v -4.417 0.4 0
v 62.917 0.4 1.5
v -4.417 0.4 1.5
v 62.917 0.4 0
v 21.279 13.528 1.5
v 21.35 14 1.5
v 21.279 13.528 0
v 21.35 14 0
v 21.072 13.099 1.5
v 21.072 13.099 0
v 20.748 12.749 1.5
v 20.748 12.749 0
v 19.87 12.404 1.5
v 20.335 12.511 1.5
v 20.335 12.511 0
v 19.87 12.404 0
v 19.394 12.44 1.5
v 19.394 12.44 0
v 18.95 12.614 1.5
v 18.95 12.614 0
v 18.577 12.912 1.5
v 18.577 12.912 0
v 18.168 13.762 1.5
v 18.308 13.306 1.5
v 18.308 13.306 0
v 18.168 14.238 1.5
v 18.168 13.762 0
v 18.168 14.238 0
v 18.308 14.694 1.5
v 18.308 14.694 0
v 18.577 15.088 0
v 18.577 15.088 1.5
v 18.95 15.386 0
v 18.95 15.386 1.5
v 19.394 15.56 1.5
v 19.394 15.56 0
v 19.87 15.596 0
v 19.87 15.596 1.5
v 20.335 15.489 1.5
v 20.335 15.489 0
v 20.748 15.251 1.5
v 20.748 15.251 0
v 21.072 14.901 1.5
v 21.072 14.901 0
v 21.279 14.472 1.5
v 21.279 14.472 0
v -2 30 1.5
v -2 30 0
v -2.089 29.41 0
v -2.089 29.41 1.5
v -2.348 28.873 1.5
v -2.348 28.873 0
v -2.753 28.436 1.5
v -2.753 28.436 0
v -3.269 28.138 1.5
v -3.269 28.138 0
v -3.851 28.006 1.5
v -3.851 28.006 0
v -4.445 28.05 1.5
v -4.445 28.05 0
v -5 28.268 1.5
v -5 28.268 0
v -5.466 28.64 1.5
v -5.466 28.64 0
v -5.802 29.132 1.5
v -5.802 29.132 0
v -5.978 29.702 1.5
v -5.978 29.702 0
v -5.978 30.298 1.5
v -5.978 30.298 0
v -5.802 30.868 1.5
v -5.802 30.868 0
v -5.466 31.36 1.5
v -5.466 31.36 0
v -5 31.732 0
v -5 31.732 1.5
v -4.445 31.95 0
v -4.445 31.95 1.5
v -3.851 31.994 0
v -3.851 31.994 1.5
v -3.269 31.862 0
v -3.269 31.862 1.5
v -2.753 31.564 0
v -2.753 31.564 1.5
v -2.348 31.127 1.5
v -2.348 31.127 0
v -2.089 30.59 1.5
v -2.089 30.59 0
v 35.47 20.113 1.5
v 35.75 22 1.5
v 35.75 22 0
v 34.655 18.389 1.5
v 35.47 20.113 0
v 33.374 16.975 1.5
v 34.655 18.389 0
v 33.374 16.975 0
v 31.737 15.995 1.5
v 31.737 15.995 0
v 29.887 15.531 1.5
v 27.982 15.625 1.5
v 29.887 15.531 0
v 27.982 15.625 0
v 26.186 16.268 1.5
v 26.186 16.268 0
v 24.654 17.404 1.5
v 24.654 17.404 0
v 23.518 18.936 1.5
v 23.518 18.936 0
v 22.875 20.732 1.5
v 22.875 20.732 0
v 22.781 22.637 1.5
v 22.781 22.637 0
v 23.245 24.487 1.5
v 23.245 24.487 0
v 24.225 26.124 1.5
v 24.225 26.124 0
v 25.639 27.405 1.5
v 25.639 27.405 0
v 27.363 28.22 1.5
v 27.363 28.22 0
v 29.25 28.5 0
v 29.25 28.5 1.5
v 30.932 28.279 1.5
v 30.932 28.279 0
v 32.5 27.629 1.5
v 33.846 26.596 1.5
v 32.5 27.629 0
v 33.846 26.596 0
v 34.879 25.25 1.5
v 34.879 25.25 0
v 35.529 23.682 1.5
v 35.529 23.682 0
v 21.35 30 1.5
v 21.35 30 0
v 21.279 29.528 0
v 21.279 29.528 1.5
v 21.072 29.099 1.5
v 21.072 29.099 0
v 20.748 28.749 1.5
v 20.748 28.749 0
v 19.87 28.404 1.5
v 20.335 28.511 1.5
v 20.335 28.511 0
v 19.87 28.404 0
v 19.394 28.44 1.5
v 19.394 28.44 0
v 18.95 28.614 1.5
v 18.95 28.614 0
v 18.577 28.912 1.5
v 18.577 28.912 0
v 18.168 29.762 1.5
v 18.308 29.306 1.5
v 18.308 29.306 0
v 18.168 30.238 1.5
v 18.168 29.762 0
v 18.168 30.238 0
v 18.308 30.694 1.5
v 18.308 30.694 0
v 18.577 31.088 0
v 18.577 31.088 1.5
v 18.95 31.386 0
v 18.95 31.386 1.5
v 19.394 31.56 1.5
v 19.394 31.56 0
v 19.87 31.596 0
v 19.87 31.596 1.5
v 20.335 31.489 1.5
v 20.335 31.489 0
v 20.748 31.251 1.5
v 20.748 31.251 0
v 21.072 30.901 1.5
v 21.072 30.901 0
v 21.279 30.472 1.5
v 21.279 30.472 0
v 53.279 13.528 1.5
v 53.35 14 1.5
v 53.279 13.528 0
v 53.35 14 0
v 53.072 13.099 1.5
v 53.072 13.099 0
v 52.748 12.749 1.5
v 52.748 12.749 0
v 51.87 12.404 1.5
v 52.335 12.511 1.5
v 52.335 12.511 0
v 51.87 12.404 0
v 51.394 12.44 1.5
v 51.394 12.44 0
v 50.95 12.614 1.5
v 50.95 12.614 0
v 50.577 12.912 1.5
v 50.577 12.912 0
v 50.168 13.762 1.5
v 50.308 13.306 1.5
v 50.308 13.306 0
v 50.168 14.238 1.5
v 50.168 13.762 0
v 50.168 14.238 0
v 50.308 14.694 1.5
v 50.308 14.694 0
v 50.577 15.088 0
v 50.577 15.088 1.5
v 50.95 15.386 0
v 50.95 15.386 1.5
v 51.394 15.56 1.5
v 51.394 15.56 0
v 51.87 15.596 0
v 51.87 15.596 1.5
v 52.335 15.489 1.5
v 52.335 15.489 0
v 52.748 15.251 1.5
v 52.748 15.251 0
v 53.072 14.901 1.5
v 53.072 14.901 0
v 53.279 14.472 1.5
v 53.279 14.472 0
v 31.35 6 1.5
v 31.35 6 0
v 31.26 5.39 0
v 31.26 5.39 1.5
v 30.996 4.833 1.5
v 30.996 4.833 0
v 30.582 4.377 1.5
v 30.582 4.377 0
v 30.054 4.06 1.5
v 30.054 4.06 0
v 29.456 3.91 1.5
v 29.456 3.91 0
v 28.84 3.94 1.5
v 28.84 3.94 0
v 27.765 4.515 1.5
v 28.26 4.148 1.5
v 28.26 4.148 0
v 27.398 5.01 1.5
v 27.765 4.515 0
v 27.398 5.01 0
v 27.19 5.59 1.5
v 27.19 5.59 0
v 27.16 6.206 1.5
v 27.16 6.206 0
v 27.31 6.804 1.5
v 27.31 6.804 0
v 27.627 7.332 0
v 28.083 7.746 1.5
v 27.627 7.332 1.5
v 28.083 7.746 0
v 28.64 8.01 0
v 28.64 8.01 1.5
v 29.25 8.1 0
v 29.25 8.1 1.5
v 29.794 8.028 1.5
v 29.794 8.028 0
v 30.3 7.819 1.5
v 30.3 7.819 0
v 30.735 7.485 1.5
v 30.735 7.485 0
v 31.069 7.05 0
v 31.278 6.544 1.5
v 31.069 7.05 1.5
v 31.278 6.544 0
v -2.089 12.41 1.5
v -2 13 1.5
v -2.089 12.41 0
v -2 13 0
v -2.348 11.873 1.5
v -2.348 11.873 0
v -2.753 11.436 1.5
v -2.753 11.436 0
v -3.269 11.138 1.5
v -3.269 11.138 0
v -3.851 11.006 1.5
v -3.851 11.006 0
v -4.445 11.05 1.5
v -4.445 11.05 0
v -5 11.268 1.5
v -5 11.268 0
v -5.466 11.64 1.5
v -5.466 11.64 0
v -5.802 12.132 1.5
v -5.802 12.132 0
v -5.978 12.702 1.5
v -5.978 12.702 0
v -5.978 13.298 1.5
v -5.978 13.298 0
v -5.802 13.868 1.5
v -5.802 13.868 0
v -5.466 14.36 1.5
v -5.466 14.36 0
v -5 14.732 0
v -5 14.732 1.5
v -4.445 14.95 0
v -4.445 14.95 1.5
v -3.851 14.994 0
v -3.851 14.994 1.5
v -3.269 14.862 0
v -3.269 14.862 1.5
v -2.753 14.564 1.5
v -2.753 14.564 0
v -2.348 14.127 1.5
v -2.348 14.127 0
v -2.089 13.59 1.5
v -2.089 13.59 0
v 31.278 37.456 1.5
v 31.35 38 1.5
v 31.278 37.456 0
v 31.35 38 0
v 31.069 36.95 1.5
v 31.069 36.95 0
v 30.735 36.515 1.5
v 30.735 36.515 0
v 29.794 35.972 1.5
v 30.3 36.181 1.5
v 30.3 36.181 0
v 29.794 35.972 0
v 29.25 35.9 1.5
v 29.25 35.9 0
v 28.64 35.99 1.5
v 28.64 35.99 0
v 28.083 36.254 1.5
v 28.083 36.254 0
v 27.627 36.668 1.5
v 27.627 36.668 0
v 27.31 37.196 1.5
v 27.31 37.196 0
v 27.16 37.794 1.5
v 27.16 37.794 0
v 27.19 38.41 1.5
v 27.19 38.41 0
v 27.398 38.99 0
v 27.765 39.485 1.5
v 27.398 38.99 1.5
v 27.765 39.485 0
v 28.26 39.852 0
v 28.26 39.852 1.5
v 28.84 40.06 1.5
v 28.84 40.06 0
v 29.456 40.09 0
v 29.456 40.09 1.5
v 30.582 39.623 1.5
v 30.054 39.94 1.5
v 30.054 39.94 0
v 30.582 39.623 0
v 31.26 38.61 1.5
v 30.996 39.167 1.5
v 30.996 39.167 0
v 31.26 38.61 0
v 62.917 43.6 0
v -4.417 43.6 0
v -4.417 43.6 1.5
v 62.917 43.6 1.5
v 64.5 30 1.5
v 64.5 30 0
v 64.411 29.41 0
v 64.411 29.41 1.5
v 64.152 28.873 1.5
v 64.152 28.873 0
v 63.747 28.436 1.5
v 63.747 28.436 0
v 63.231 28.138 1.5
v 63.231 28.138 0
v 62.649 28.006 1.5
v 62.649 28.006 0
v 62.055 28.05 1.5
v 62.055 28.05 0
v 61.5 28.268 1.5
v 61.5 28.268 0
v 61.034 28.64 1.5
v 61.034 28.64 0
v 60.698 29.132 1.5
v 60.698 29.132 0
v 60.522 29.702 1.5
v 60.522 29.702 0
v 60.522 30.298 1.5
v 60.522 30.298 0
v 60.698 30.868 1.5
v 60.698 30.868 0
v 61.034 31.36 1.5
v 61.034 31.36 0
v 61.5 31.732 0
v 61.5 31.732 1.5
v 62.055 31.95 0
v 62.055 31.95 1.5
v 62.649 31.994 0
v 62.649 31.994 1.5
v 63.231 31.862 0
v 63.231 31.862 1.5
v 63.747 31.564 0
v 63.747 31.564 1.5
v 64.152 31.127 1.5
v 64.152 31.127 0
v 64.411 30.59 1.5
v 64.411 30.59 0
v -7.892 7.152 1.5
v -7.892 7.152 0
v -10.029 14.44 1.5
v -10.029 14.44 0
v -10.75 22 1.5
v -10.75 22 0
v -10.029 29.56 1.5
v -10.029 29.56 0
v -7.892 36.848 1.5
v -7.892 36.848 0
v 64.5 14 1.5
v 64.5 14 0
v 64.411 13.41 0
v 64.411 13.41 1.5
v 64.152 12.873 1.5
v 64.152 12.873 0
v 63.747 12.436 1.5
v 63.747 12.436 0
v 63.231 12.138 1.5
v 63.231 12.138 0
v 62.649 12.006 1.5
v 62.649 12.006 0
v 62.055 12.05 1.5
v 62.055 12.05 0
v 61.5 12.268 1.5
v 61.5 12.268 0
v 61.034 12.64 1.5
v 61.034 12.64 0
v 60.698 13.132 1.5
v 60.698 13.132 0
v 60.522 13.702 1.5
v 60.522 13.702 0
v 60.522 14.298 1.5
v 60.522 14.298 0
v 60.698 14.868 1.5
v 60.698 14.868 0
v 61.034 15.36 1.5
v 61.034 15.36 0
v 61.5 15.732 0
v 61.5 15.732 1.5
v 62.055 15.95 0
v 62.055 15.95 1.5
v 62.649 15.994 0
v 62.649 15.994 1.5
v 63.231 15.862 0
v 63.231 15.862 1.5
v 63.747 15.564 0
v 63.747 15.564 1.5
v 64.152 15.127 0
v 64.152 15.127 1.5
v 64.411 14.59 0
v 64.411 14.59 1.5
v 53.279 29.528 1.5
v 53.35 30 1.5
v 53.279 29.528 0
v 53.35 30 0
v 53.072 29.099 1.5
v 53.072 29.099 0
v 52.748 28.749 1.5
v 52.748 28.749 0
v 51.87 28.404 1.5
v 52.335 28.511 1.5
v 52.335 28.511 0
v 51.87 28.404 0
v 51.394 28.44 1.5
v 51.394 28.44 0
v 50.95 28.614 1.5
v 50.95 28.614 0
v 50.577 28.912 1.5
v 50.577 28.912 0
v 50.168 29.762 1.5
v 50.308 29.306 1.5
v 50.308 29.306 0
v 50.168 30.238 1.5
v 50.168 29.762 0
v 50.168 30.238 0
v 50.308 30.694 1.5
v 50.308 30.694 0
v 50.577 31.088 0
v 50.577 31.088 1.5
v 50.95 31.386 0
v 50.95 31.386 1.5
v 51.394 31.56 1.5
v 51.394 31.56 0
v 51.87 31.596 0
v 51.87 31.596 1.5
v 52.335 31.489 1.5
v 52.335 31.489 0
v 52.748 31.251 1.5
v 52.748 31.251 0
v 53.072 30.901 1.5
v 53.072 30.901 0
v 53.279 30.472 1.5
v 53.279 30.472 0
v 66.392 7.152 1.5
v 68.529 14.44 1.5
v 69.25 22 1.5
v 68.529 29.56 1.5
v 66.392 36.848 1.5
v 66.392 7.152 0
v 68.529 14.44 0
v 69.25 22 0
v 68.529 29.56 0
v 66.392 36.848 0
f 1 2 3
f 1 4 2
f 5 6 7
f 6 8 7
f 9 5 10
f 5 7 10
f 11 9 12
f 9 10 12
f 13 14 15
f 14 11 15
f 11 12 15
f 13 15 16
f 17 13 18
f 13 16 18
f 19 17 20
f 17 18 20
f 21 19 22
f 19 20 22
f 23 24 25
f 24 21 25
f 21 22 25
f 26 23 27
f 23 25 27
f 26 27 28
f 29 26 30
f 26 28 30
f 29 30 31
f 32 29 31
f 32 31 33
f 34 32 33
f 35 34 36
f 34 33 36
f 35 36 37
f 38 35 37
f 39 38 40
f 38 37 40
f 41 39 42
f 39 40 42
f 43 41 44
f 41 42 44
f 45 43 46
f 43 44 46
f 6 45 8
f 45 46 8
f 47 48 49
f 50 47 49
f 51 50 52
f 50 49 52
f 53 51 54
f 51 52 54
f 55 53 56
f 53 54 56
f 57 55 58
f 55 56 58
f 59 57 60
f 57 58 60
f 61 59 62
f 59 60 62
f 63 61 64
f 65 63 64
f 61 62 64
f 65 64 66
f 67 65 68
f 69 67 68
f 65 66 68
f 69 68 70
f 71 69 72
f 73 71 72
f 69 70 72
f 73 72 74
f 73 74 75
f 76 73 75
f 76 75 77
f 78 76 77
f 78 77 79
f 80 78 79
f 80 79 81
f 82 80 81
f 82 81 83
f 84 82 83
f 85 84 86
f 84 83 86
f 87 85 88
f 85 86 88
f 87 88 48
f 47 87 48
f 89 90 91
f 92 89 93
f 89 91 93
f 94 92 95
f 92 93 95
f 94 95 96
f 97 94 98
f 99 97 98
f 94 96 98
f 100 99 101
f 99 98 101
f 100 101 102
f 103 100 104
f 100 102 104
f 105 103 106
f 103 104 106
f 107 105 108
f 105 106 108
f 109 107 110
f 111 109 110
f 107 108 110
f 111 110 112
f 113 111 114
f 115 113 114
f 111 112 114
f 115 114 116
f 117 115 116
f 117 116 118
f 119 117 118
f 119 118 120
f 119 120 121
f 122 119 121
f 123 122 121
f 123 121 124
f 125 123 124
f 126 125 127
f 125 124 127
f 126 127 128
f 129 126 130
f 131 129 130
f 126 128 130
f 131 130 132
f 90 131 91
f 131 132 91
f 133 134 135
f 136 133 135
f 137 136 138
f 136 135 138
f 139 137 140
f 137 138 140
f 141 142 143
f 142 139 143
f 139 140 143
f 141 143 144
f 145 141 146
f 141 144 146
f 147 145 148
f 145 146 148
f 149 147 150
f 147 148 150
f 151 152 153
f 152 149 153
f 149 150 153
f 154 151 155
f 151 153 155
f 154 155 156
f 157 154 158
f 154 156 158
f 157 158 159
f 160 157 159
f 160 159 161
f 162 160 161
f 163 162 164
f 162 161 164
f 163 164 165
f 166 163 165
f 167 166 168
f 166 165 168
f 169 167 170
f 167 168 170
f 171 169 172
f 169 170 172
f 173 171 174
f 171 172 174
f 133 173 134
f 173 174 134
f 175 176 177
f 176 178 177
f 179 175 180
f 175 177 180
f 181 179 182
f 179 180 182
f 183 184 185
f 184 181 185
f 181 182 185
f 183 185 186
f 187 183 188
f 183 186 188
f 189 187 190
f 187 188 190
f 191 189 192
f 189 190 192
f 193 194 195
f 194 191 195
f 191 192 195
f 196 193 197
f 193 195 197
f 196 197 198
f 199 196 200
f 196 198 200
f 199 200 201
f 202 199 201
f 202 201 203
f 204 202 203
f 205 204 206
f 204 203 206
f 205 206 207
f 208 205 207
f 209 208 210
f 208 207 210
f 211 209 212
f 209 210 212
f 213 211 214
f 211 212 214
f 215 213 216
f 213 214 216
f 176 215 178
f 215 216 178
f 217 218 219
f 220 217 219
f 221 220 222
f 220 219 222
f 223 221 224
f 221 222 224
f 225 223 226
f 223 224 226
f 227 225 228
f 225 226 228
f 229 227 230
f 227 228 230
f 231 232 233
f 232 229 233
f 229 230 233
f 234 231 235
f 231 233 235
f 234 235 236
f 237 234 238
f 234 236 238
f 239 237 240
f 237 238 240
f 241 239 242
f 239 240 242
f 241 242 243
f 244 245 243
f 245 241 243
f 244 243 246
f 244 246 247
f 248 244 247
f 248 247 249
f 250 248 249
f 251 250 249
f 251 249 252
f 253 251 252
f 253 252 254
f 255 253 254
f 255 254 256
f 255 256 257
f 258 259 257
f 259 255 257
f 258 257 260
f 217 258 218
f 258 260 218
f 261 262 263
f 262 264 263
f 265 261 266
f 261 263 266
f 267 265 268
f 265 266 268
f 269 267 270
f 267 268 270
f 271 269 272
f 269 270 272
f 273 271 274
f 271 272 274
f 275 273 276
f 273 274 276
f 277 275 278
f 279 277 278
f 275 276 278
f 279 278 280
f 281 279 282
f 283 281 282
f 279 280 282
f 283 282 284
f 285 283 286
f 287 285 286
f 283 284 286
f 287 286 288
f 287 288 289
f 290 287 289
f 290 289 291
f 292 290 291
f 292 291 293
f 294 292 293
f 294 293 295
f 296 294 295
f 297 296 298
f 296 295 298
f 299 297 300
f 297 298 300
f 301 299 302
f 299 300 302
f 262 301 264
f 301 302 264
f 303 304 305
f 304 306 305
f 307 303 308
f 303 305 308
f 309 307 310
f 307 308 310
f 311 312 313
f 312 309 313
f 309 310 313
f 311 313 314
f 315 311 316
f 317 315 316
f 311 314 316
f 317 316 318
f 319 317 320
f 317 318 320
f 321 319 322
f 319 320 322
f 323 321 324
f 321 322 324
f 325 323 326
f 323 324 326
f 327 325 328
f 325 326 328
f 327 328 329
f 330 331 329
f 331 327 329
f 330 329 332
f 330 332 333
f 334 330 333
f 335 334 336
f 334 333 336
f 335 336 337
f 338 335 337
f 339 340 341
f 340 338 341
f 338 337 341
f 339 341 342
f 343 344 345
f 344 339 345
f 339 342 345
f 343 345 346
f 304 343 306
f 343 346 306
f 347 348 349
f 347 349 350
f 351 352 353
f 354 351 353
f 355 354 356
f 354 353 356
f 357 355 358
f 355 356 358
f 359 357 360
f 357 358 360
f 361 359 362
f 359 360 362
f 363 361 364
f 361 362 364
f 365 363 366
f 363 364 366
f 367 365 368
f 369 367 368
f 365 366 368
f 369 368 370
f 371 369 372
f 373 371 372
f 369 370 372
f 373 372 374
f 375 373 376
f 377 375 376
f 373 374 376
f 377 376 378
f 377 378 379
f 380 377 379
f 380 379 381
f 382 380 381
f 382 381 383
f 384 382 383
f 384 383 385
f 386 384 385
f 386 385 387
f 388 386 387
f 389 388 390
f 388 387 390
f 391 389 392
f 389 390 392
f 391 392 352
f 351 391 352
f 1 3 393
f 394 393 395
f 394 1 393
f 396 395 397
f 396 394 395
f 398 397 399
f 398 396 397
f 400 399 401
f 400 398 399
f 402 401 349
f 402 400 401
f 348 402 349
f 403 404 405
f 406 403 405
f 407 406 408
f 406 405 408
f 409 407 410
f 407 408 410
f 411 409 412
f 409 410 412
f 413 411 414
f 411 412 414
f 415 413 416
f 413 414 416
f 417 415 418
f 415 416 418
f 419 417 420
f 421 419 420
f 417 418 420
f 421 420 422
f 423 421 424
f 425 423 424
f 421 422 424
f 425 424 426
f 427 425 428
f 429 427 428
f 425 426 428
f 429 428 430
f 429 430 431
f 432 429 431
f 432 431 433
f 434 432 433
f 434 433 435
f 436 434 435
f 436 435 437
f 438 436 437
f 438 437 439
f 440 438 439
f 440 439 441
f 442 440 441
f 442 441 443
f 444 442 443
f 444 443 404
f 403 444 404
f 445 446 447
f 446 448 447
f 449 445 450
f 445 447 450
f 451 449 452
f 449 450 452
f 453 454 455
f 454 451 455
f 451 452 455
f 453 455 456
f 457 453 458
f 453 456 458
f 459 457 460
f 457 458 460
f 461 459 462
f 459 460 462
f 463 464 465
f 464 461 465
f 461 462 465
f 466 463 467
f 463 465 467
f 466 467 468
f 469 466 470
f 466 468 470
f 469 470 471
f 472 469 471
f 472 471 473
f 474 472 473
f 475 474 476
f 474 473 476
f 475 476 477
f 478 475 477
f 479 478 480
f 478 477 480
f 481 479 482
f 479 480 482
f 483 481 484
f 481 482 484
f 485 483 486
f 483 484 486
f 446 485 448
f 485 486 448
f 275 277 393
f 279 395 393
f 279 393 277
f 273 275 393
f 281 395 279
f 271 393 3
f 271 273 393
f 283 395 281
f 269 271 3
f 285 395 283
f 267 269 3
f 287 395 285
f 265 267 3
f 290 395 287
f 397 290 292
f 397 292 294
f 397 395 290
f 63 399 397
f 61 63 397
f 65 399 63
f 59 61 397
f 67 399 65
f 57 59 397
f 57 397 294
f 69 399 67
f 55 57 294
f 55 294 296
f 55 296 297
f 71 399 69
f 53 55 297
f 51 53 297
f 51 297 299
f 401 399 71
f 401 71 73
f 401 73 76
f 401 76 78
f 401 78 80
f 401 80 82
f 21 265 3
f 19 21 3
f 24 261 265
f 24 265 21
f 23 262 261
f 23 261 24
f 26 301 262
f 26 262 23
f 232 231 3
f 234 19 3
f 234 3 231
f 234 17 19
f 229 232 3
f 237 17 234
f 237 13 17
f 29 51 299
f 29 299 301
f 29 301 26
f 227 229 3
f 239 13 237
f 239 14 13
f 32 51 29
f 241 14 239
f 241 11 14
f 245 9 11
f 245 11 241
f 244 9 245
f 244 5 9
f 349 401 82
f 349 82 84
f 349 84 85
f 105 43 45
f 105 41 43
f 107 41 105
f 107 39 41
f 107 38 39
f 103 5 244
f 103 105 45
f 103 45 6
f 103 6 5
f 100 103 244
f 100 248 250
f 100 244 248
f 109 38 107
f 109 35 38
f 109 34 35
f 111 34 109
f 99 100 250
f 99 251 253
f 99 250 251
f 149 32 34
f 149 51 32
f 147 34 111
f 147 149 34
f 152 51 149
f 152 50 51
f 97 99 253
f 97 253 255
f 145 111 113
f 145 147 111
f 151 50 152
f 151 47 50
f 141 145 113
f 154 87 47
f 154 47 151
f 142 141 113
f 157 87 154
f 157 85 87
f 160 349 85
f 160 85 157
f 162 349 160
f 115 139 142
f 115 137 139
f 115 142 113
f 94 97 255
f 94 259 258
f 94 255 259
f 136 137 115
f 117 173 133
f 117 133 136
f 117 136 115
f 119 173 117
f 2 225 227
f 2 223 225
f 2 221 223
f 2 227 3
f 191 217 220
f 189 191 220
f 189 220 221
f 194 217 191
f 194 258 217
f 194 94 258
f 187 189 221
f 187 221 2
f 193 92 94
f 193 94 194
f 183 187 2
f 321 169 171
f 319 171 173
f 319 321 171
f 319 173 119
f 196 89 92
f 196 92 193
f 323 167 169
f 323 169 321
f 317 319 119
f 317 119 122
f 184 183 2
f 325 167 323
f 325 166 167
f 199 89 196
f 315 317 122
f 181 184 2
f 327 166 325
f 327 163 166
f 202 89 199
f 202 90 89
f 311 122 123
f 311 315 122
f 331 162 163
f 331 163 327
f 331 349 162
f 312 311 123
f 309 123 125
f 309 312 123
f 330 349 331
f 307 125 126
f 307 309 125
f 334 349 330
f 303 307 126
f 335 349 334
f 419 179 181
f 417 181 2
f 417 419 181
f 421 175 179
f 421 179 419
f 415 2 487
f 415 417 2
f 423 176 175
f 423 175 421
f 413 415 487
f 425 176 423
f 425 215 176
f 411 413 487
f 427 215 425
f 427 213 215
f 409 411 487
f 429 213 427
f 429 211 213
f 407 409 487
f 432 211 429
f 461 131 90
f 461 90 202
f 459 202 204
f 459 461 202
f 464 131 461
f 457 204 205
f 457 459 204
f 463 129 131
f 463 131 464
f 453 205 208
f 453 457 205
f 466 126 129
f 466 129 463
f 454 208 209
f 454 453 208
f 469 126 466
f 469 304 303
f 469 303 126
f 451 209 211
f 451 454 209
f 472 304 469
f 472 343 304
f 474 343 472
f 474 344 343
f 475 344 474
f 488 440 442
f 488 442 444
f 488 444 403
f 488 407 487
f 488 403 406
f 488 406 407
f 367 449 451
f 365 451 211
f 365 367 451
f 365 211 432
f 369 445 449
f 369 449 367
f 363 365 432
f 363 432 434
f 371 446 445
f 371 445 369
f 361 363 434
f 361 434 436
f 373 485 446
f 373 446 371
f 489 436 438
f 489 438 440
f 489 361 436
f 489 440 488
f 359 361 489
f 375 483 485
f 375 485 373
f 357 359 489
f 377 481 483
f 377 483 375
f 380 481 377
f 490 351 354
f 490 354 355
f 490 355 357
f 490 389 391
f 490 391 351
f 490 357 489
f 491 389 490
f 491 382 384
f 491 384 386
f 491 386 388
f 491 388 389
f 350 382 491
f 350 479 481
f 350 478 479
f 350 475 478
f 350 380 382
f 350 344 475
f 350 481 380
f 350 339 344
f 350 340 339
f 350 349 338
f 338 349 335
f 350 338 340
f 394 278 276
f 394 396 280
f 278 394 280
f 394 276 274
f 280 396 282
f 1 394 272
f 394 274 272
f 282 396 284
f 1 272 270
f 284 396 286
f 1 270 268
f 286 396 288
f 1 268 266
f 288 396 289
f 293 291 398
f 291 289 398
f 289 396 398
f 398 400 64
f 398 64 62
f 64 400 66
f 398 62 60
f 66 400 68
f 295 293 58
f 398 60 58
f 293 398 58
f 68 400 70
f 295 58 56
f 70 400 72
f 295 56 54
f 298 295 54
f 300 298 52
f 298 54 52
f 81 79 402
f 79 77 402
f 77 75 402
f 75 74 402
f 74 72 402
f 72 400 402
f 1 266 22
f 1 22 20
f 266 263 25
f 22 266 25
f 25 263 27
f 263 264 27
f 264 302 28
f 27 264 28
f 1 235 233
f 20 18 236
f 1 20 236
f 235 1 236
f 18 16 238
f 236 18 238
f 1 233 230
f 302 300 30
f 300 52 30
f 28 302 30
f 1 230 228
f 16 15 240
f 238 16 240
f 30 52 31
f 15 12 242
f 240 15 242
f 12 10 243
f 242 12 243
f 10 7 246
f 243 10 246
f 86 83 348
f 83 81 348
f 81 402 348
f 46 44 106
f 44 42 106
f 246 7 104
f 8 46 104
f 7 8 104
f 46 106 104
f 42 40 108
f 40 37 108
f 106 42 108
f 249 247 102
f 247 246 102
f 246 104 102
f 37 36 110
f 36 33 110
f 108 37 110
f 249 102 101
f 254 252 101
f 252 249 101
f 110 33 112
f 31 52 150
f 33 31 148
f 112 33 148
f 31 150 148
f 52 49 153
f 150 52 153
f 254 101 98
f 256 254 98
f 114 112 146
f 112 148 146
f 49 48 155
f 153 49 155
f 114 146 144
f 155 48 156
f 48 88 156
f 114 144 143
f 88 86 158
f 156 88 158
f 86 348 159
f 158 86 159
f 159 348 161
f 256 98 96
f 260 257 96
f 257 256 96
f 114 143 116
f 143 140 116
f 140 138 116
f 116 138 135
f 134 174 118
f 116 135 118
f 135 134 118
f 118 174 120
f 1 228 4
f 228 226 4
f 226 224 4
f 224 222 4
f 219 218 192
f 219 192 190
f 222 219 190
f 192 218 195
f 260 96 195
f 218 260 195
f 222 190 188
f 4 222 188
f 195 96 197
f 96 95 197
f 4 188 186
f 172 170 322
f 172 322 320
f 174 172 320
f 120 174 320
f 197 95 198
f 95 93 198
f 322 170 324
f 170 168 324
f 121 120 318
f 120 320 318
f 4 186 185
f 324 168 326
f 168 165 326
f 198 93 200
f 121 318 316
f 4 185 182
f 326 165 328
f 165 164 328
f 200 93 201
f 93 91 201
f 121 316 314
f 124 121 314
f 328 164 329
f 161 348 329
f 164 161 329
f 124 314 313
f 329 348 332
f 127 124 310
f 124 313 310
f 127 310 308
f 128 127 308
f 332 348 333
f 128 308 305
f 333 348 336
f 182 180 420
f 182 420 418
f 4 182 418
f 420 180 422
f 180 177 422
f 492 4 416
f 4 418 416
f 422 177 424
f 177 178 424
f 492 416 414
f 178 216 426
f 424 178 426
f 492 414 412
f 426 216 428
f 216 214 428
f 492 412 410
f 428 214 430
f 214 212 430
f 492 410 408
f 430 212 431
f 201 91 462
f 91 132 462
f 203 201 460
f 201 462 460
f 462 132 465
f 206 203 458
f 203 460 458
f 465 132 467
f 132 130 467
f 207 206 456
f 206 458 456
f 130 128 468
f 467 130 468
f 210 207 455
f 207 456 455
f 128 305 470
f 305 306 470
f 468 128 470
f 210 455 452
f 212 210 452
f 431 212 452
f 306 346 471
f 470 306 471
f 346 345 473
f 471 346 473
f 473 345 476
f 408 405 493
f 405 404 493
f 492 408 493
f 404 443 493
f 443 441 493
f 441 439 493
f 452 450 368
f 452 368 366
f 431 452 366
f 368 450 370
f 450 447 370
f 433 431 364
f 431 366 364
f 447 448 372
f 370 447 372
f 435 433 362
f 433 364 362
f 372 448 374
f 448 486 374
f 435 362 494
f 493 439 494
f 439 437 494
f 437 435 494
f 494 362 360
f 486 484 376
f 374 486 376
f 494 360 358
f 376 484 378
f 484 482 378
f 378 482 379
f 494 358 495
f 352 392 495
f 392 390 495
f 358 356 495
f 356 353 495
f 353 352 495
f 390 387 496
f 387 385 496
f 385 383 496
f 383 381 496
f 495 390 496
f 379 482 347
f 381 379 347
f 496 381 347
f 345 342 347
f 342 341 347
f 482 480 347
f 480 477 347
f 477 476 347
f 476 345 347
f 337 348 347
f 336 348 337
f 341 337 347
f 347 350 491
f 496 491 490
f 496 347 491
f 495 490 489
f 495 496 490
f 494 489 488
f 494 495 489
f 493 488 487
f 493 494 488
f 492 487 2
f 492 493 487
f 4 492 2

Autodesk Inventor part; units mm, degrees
ref_plane "YZ Plane" through (0, 0, 0) normal (1, 0, 0) x (0, 1, 0)
ref_plane "XZ Plane" through (0, 0, 0) normal (0, 1, 0) x (-1, 0, 0)
ref_plane "XY Plane" through (0, 0, 0) normal (0, 0, 1) x (1, 0, 0)
sketch "スケッチ1" plane through (0, 0, 0) normal (0, 0, 1) x (1, 0, 0)
  line L0 (24.05, 13.6) -> (24.05, 0.4) projected
  line L1 (24.05, 13.6) -> (37.25, 13.6) projected
  line L2 (37.25, 13.6) -> (37.25, 0.4) projected
  line L3 (56.5, 0.4) -> (37.25, 0.4) projected
  line L4 (56.5, 43.6) -> (56.5, 0.4) projected
  line L5 (2, 43.6) -> (56.5, 43.6) projected
  line L6 (2, 43.6) -> (2, 0.4) projected
  line L7 (24.05, 0.4) -> (2, 0.4) projected
  circle A0 centre (19.75, 30) radius 1.35 projected
  circle A1 centre (51.75, 14) radius 1.35 projected
  circle A2 centre (51.75, 30) radius 1.35 projected
  circle A3 centre (19.75, 14) radius 1.35 projected
  line L8 (2, 43.6) -> (56.5, 43.6)
  line L9 (56.5, 43.6) -> (56.5, 0.4)
  line L10 (56.5, 0.4) -> (2, 0.4)
  line L11 (2, 0.4) -> (2, 43.6)
  circle A4 centre (19.75, 14) radius 1.6
  circle A5 centre (19.75, 30) radius 1.6
  circle A6 centre (51.75, 30) radius 1.6
  circle A7 centre (51.75, 14) radius 1.6
  line L12 (-3.8486, -27.4677) -> (-13.8486, -27.4561) projected
  line L13 (34.25, -27.4677) -> (34.25, 112.5)
  line L14 (24.25, -27.4561) -> (24.25, 112.5)
  line L15 (24.25, 22) -> (34.25, 22)
  circle A8 centre (29.25, 22) radius 6.5
  circle A9 centre (29.25, 22) radius 40
  line L16 (2, 22) -> (-10.75, 22)
  line L17 (56.5, 22) -> (69.25, 22)
  line L18 (2, 22) -> (-4, 22)
  line L19 (-4, 22) -> (-4, 13)
  line L20 (-4, 13) -> (2, 13)
  line L21 (2, 13) -> (2, 22)
  line L22 (2, 22) -> (-4, 22)
  line L23 (-4, 22) -> (-4, 30)
  line L24 (-4, 30) -> (2, 30)
  line L25 (2, 30) -> (2, 22)
  line L26 (56.5, 22) -> (62.5, 22)
  line L27 (62.5, 22) -> (62.5, 14)
  line L28 (62.5, 14) -> (56.5, 14)
  line L29 (56.5, 14) -> (56.5, 22)
  line L30 (56.5, 22) -> (62.5, 22)
  line L31 (62.5, 22) -> (62.5, 30)
  line L32 (62.5, 30) -> (56.5, 30)
  line L33 (56.5, 30) -> (56.5, 22)
  circle A10 centre (-4, 13) radius 2
  circle A11 centre (-4, 30) radius 2
  circle A12 centre (62.5, 30) radius 2
  circle A13 centre (62.5, 14) radius 2
  line L34 (2, 43.6) -> (-4.4166, 43.6)
  line L35 (56.5, 43.6) -> (62.9166, 43.6)
  line L36 (2, 0.4) -> (-4.4166, 0.4)
  line L37 (56.5, 0.4) -> (62.9166, 0.4)
  line L38 (29.25, 22) -> (29.25, 38)
  line L39 (29.25, 22) -> (45.25, 22) construction
  line L40 (29.25, 22) -> (29.25, 6)
  line L41 (29.25, 22) -> (45.25, 22) construction
  circle A14 centre (29.25, 38) radius 2.1
  circle A15 centre (29.25, 6) radius 2.1
  point P0 (0, 0)
  point P1 (34.25, 112.5)
  point P2 (24.25, 112.5)
  point P3 (63.0326, 0.5819)
  point P4 (61.25, 46)
  point P5 (24.3716, 20.9038)
  point P6 (24.3687, 23.0832)
  point P7 (25.6996, 25.5206)
  point P8 (25.082, 19.2381)
  dimension "d7" = 80
  dimension "d0" = 3.2
  dimension "d1" = 3.2
  dimension "d2" = 3.2
  dimension "d3" = 3.2
  dimension "d6" = 13
  dimension "d8" = 6
  dimension "d9" = 9
  dimension "d10" = 6
  dimension "d11" = 4
  dimension "d12" = 4
  dimension "d13" = 4
  dimension "d14" = 4
  dimension "d15" = 16
  dimension "d16" = 90
  dimension "d17" = 16
  dimension "d18" = 90
  dimension "d19" = 4.2
  dimension "d20" = 4.2
extrude "押し出し1" add sketch "スケッチ1" along normal blind 1.5 contours L1 L14 L10 L0 | L0 L7 L6 L5 L14 A8 L1 | L14 A8 L40 L1 | L1 L13 L10 L14 | L36 A9 L16 L19 A10 L20 L6 | L40 A8 L13 L1 | L20 A10 L19 L16 L6 | L13 L1 L2 L10 | L13 A8 L5 L4 L3 L2 L1 | L14 L5 L13 A8 | L16 L23 A11 L24 L6 | A9 L34 L6 L24 A11 L23 L16 | L4 L28 A13 L27 L17 A9 L37 | L4 L17 L27 A13 L28 | L17 L31 A12 L32 L4 L35 A9 | L4 L32 A12 L31 L17
sketch "スケッチ2" plane through (0, 0, 1.5) normal (0, 0, 1) x (1, 0, 0)
  point P0 (0, 0)
properties part number "ダイナミクセル側面取り付け"
